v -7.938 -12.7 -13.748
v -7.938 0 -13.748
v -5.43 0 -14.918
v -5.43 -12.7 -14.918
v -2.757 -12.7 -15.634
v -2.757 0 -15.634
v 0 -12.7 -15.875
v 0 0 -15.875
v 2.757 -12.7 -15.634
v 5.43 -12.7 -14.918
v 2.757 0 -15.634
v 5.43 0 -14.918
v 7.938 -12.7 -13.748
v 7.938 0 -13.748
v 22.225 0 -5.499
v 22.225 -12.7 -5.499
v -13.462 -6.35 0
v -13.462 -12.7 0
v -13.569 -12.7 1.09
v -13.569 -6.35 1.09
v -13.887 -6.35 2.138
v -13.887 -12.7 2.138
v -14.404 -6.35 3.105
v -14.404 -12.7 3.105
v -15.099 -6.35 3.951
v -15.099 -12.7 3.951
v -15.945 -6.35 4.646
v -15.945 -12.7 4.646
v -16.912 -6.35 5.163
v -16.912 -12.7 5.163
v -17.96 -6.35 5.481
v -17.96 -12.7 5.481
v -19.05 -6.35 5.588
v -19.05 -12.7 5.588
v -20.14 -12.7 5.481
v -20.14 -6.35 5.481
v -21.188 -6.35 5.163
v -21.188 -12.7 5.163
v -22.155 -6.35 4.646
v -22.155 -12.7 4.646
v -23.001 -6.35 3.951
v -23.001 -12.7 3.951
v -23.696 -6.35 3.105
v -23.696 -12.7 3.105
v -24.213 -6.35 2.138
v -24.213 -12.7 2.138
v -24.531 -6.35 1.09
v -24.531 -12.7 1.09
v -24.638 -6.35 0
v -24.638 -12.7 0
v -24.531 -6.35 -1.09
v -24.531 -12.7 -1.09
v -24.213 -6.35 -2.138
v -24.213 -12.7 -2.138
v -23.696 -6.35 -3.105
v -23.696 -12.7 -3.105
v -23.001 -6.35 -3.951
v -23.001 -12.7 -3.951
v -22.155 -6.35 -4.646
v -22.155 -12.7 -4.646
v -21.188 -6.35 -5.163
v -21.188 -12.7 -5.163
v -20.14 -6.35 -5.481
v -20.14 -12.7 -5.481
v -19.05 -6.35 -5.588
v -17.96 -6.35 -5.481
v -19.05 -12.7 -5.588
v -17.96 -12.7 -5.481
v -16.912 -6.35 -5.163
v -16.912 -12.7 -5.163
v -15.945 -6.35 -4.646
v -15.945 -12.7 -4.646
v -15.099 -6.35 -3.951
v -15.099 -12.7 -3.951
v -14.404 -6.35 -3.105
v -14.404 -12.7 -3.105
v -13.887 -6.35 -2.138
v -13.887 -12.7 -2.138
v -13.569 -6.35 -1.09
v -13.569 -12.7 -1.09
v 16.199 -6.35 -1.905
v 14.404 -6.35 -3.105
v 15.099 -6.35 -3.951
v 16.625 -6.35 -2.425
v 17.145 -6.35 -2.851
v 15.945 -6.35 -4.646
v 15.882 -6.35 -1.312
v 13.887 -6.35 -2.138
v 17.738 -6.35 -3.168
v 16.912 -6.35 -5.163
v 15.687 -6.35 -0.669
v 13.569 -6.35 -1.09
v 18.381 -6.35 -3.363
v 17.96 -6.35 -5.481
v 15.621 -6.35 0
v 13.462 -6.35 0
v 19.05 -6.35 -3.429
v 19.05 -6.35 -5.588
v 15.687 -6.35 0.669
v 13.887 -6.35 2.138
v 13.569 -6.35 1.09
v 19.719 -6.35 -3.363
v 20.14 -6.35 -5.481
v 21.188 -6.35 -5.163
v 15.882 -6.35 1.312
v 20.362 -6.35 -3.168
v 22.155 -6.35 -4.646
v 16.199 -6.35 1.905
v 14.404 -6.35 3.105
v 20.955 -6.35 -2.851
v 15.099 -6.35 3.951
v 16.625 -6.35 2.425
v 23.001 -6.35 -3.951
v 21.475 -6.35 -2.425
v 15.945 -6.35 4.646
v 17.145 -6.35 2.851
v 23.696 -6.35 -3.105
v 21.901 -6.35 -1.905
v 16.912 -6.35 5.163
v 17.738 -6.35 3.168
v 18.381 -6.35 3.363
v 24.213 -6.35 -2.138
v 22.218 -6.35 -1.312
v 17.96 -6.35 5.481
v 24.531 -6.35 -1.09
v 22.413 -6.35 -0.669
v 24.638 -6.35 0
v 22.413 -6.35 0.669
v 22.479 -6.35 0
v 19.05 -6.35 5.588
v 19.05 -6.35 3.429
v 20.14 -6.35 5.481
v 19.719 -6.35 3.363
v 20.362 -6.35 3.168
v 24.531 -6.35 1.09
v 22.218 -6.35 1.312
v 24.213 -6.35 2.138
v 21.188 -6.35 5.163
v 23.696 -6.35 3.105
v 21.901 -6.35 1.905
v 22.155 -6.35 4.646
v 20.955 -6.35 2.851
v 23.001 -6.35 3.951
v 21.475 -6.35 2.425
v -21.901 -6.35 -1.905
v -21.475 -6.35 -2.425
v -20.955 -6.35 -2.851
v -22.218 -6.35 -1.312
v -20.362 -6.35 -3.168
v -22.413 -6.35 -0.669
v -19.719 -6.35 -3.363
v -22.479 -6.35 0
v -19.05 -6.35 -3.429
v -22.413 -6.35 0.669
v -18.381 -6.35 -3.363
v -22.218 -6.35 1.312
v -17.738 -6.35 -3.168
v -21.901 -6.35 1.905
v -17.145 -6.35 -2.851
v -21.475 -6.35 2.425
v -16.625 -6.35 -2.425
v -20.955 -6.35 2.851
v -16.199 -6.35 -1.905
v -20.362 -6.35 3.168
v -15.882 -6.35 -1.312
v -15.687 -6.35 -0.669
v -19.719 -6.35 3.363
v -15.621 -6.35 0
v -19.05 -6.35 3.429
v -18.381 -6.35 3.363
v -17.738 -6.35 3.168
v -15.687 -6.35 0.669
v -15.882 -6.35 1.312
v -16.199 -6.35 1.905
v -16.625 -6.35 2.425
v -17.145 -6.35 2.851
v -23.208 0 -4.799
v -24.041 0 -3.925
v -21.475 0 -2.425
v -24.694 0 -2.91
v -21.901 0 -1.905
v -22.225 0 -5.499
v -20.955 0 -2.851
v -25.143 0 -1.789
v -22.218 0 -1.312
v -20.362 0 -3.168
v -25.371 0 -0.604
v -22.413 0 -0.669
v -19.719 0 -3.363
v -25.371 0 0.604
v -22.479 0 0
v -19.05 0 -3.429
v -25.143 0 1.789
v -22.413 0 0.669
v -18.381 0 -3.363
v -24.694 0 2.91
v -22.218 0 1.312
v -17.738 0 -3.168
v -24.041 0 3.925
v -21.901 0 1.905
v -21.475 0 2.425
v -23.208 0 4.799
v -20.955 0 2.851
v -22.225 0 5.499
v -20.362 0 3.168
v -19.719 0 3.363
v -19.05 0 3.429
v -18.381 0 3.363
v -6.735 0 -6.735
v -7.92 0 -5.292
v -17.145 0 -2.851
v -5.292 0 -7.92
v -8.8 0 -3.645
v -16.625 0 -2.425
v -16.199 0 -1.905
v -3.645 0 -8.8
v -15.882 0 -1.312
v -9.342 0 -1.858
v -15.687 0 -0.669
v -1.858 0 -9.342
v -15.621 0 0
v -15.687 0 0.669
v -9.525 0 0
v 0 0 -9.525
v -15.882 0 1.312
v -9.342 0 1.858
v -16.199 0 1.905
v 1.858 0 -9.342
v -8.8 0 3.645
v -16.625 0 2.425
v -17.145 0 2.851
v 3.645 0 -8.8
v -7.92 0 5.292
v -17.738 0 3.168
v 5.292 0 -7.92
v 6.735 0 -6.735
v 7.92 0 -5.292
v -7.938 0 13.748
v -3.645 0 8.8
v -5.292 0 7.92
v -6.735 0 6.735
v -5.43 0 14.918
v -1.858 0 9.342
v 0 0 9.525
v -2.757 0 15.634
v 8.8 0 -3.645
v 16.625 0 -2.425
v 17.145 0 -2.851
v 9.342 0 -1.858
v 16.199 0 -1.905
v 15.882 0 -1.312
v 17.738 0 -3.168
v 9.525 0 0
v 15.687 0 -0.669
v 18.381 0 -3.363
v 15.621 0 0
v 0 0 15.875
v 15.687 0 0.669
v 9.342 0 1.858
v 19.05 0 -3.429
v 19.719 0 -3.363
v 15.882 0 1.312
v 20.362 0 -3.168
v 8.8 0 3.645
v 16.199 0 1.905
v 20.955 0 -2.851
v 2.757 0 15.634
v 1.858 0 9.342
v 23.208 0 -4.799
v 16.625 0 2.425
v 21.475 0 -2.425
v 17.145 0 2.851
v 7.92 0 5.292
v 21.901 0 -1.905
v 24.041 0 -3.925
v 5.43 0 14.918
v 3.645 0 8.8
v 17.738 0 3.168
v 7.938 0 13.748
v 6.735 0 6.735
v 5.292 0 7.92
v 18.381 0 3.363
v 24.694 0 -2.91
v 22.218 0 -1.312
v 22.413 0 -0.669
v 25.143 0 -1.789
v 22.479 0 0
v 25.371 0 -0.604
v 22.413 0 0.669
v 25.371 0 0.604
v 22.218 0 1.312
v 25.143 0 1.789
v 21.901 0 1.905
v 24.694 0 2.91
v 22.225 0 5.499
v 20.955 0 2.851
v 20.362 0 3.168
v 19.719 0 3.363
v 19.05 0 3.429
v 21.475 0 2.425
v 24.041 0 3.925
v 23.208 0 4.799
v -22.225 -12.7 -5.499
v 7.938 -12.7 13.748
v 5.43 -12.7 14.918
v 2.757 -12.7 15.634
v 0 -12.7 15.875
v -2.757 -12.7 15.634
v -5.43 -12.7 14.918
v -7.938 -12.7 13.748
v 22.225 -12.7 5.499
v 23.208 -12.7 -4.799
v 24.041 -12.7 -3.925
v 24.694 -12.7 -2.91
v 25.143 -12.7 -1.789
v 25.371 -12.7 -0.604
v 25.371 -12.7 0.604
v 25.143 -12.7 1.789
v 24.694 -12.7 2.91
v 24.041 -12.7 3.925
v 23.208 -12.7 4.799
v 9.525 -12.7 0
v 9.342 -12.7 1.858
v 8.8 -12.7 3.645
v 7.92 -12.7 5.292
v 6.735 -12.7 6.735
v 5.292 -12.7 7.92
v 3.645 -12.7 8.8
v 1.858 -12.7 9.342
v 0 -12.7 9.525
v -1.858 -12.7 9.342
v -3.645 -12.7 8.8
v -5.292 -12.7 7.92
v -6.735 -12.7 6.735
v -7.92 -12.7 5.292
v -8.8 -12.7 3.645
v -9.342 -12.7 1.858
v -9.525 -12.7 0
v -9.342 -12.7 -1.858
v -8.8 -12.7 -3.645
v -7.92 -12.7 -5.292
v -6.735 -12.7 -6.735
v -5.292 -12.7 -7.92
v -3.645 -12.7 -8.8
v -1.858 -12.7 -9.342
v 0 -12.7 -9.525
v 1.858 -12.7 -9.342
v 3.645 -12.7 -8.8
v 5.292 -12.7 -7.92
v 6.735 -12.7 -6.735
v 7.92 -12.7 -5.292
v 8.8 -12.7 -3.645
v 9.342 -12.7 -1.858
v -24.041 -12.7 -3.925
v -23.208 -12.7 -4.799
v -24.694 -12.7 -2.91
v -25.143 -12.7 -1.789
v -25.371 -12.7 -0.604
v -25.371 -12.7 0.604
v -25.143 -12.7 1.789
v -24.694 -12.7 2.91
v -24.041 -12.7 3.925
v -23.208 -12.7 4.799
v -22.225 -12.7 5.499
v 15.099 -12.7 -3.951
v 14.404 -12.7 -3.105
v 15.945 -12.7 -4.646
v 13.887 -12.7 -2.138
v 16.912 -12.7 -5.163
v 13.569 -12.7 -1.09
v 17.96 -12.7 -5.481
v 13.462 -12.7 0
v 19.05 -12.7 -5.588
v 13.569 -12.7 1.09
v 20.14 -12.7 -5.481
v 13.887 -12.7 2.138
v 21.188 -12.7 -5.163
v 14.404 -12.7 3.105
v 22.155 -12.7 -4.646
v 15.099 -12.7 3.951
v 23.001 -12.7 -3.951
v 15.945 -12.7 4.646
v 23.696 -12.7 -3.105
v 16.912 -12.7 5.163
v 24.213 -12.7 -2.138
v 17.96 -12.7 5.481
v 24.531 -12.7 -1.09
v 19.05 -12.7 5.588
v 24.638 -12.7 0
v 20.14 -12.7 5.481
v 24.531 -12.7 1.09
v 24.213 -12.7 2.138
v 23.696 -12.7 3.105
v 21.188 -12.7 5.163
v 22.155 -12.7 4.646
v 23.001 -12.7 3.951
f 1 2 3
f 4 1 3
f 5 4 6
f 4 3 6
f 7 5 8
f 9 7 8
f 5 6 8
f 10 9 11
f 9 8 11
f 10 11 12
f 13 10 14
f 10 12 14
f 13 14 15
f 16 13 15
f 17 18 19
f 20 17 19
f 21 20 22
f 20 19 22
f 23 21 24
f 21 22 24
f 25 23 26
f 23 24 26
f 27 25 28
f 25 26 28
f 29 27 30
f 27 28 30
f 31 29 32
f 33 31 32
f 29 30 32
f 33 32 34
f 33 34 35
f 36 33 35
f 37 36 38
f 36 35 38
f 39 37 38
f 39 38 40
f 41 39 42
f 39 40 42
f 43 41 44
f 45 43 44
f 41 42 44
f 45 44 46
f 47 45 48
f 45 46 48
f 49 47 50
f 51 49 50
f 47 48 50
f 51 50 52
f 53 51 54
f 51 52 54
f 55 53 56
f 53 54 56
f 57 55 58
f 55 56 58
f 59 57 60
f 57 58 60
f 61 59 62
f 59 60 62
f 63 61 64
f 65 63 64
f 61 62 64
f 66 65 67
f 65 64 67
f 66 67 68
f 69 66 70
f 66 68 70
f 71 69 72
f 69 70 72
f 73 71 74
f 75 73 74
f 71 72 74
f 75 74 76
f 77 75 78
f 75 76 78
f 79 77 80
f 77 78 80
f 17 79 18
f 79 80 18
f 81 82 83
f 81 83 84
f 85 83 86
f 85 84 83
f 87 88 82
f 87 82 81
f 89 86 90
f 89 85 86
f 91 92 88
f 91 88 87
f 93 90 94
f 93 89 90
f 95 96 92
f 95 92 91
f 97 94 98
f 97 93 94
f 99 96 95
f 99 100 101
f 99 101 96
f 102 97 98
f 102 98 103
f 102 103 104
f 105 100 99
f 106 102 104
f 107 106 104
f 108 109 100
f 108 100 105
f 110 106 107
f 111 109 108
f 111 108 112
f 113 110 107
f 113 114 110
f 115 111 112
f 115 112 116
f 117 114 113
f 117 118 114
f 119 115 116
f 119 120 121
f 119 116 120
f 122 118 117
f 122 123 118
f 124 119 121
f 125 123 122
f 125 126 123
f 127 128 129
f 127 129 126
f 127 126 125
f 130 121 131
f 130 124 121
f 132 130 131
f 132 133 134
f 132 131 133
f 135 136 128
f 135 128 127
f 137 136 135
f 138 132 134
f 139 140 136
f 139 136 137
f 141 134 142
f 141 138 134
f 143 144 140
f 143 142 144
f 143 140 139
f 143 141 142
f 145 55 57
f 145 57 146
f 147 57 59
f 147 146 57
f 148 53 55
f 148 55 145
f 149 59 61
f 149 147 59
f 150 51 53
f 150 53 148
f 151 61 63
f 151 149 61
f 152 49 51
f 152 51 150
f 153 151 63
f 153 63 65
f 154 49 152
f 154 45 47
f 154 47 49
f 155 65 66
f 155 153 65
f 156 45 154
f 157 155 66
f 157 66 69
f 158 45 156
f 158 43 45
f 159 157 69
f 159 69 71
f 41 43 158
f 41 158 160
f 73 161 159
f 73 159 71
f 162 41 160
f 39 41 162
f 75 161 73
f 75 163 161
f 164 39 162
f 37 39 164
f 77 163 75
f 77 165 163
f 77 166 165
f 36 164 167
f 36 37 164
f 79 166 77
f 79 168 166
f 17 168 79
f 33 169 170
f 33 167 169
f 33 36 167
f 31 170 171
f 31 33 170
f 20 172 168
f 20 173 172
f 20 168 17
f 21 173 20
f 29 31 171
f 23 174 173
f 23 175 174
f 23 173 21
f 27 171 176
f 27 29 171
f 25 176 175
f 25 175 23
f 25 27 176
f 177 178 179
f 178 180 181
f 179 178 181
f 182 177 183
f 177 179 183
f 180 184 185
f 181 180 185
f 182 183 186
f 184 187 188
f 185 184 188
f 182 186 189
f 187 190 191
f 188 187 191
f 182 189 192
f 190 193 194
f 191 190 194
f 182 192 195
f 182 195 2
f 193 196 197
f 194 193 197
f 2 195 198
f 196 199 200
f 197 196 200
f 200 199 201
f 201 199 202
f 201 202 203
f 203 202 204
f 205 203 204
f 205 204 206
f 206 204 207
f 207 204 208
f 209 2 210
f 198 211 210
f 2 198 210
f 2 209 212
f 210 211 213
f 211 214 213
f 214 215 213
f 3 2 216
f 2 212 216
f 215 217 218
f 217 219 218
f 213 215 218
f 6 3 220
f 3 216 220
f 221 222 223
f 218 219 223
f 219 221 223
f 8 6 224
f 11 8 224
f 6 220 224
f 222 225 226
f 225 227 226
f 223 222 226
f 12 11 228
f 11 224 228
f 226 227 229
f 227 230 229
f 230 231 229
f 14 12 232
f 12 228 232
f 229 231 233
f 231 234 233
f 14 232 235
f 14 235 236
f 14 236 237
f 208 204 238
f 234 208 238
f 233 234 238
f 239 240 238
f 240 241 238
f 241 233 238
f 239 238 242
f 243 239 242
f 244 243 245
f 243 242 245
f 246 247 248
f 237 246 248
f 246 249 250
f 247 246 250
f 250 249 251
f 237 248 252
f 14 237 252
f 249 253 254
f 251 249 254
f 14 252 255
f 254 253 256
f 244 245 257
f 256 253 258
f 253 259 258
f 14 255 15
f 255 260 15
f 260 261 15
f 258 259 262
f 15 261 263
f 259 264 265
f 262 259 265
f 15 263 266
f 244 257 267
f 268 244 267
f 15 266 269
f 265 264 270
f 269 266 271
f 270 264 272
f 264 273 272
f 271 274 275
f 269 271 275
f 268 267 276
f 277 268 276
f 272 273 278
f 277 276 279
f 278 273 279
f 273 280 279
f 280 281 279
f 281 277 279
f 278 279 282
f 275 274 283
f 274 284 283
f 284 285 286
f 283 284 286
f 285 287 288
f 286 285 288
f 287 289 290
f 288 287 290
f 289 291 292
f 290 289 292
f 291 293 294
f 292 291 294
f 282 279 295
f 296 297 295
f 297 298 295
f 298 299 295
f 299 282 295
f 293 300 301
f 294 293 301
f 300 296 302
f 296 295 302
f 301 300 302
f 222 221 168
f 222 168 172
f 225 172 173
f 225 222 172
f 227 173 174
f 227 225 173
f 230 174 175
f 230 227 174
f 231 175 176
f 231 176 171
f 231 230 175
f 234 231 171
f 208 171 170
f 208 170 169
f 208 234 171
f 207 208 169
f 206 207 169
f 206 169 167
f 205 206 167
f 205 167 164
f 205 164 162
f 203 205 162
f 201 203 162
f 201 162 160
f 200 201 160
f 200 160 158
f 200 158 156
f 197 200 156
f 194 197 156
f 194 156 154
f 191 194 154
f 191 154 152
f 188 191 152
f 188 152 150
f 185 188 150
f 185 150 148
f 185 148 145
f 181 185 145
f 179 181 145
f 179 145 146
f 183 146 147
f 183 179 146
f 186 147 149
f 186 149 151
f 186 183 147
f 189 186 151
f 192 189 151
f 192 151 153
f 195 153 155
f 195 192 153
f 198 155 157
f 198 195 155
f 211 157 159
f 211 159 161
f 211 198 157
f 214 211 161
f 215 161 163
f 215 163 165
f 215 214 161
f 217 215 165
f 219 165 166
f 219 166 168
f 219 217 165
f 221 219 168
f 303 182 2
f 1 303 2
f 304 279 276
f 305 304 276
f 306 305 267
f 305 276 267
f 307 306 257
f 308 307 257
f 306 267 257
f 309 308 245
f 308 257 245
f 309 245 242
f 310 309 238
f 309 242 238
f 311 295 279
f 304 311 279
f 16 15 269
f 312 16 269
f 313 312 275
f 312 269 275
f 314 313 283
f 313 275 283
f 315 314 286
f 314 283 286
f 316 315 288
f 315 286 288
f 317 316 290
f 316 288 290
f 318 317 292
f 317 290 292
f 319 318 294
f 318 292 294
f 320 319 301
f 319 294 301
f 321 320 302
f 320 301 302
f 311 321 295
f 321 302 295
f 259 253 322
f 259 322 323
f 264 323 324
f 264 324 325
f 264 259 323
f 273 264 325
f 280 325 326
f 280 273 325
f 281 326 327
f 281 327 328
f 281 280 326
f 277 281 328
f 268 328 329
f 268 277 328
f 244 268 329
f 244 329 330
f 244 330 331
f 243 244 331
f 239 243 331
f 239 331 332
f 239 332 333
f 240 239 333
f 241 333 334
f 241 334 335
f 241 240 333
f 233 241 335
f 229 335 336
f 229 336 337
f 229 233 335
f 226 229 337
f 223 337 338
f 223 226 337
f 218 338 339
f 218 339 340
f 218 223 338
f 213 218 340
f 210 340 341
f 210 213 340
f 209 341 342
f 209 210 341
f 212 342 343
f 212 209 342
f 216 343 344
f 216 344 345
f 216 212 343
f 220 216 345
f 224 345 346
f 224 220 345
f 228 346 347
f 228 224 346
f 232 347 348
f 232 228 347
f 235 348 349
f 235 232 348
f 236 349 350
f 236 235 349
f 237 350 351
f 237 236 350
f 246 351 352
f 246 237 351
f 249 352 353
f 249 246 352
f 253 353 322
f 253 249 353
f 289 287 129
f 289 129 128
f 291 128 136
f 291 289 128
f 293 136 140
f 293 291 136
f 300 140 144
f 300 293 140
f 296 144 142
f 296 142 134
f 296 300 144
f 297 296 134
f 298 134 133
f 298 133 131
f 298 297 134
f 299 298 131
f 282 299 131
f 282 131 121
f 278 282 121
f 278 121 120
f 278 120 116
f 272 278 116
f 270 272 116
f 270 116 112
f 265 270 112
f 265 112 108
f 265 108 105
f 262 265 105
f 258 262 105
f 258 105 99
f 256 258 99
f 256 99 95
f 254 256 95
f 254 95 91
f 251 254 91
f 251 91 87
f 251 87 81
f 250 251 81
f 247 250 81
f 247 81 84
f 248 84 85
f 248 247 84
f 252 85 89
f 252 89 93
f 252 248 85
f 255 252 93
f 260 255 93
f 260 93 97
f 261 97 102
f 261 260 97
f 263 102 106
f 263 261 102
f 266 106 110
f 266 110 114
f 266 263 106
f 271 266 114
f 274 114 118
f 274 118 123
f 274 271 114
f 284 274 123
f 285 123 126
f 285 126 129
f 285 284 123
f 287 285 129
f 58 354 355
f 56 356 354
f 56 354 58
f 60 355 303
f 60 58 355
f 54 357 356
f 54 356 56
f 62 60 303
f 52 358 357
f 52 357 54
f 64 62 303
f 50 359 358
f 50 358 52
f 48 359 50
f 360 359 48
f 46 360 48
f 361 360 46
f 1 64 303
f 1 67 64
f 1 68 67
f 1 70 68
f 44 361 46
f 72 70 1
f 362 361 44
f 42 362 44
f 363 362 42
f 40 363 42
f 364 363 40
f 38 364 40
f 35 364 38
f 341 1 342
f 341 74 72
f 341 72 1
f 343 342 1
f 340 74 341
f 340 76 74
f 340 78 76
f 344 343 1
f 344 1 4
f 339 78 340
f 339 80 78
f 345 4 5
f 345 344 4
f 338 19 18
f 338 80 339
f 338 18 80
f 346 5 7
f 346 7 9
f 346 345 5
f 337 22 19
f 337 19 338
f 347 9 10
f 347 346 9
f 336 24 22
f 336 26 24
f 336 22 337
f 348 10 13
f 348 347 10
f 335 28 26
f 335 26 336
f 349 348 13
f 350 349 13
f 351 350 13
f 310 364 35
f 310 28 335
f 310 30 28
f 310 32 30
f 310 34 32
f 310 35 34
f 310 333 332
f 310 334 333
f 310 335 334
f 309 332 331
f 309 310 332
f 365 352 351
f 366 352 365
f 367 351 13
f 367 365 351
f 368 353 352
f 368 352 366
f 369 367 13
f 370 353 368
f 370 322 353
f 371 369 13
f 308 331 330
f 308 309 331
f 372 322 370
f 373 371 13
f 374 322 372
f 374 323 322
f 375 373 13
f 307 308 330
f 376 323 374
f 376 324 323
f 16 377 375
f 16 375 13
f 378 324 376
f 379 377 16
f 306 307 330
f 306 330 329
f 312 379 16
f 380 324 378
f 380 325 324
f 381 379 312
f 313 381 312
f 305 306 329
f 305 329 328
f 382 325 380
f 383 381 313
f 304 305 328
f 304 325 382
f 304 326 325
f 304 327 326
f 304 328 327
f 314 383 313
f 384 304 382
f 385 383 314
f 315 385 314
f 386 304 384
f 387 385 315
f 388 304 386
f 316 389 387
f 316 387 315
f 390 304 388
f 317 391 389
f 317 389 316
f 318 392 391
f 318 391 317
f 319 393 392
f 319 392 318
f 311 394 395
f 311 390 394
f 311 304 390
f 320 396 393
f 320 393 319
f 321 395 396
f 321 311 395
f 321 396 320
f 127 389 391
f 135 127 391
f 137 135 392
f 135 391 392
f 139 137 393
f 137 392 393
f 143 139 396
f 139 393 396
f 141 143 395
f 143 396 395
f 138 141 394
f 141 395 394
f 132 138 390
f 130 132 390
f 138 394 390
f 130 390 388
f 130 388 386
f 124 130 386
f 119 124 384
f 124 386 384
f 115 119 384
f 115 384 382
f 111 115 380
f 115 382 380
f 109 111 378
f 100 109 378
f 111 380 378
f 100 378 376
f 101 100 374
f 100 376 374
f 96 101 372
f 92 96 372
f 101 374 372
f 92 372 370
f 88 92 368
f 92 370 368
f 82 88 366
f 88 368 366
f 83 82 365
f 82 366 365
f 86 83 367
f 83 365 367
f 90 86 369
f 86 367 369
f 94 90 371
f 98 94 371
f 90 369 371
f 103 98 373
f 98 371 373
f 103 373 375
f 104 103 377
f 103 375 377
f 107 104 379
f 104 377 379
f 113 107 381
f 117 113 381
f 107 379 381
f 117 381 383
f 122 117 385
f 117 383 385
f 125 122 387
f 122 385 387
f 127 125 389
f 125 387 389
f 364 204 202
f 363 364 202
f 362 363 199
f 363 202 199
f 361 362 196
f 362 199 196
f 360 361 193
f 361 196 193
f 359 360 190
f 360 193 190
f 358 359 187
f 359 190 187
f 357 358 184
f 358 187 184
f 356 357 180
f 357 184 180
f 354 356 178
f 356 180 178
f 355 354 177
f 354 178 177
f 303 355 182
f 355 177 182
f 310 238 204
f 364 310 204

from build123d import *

# Parameters (mm, degrees)
F0_R     = 3.429
F0_R_2   = 9.525
F1_DEPTH = 12.7
F2_R     = 5.588
F2_R_2   = 3.429
F3_DEPTH = 6.35


with BuildPart() as f1:
    # F0 (on Front) → F1 (new body)
    with BuildSketch(Plane.XZ):
        with BuildLine():
            Line((-7.9375, 13.748153), (-22.225, 5.499261))
            ThreePointArc((-22.225, 5.499261), (-25.4, 0), (-22.225, -5.499261))
            Line((-22.225, -5.499261), (-7.9375, -13.748153))
            ThreePointArc((-7.9375, -13.748153), (0, -15.875), (7.9375, -13.748153))
            Line((7.9375, -13.748153), (22.225, -5.499261))
            ThreePointArc((22.225, -5.499261), (25.4, 0), (22.225, 5.499261))
            Line((22.225, 5.499261), (7.9375, 13.748153))
            ThreePointArc((7.9375, 13.748153), (0, 15.875), (-7.9375, 13.748153))
        make_face()
        with Locations((-19.05, 0)):
            Circle(F0_R, mode=Mode.SUBTRACT)
        Circle(F0_R_2, mode=Mode.SUBTRACT)
        with Locations((19.05, 0)):
            Circle(F0_R, mode=Mode.SUBTRACT)
    extrude(amount=F1_DEPTH)

    # F2 (on face) → F3 (cut)
    with BuildSketch(Plane.XZ.offset(12.7)):
        with Locations((-19.05, 0)):
            Circle(F2_R)
        with Locations((-19.05, 0)):
            Circle(F2_R_2, mode=Mode.SUBTRACT)
        with Locations((19.05, 0)):
            Circle(F2_R)
        with Locations((19.05, 0)):
            Circle(F2_R_2, mode=Mode.SUBTRACT)
    extrude(amount=-F3_DEPTH, mode=Mode.SUBTRACT)


solid = f1.part
